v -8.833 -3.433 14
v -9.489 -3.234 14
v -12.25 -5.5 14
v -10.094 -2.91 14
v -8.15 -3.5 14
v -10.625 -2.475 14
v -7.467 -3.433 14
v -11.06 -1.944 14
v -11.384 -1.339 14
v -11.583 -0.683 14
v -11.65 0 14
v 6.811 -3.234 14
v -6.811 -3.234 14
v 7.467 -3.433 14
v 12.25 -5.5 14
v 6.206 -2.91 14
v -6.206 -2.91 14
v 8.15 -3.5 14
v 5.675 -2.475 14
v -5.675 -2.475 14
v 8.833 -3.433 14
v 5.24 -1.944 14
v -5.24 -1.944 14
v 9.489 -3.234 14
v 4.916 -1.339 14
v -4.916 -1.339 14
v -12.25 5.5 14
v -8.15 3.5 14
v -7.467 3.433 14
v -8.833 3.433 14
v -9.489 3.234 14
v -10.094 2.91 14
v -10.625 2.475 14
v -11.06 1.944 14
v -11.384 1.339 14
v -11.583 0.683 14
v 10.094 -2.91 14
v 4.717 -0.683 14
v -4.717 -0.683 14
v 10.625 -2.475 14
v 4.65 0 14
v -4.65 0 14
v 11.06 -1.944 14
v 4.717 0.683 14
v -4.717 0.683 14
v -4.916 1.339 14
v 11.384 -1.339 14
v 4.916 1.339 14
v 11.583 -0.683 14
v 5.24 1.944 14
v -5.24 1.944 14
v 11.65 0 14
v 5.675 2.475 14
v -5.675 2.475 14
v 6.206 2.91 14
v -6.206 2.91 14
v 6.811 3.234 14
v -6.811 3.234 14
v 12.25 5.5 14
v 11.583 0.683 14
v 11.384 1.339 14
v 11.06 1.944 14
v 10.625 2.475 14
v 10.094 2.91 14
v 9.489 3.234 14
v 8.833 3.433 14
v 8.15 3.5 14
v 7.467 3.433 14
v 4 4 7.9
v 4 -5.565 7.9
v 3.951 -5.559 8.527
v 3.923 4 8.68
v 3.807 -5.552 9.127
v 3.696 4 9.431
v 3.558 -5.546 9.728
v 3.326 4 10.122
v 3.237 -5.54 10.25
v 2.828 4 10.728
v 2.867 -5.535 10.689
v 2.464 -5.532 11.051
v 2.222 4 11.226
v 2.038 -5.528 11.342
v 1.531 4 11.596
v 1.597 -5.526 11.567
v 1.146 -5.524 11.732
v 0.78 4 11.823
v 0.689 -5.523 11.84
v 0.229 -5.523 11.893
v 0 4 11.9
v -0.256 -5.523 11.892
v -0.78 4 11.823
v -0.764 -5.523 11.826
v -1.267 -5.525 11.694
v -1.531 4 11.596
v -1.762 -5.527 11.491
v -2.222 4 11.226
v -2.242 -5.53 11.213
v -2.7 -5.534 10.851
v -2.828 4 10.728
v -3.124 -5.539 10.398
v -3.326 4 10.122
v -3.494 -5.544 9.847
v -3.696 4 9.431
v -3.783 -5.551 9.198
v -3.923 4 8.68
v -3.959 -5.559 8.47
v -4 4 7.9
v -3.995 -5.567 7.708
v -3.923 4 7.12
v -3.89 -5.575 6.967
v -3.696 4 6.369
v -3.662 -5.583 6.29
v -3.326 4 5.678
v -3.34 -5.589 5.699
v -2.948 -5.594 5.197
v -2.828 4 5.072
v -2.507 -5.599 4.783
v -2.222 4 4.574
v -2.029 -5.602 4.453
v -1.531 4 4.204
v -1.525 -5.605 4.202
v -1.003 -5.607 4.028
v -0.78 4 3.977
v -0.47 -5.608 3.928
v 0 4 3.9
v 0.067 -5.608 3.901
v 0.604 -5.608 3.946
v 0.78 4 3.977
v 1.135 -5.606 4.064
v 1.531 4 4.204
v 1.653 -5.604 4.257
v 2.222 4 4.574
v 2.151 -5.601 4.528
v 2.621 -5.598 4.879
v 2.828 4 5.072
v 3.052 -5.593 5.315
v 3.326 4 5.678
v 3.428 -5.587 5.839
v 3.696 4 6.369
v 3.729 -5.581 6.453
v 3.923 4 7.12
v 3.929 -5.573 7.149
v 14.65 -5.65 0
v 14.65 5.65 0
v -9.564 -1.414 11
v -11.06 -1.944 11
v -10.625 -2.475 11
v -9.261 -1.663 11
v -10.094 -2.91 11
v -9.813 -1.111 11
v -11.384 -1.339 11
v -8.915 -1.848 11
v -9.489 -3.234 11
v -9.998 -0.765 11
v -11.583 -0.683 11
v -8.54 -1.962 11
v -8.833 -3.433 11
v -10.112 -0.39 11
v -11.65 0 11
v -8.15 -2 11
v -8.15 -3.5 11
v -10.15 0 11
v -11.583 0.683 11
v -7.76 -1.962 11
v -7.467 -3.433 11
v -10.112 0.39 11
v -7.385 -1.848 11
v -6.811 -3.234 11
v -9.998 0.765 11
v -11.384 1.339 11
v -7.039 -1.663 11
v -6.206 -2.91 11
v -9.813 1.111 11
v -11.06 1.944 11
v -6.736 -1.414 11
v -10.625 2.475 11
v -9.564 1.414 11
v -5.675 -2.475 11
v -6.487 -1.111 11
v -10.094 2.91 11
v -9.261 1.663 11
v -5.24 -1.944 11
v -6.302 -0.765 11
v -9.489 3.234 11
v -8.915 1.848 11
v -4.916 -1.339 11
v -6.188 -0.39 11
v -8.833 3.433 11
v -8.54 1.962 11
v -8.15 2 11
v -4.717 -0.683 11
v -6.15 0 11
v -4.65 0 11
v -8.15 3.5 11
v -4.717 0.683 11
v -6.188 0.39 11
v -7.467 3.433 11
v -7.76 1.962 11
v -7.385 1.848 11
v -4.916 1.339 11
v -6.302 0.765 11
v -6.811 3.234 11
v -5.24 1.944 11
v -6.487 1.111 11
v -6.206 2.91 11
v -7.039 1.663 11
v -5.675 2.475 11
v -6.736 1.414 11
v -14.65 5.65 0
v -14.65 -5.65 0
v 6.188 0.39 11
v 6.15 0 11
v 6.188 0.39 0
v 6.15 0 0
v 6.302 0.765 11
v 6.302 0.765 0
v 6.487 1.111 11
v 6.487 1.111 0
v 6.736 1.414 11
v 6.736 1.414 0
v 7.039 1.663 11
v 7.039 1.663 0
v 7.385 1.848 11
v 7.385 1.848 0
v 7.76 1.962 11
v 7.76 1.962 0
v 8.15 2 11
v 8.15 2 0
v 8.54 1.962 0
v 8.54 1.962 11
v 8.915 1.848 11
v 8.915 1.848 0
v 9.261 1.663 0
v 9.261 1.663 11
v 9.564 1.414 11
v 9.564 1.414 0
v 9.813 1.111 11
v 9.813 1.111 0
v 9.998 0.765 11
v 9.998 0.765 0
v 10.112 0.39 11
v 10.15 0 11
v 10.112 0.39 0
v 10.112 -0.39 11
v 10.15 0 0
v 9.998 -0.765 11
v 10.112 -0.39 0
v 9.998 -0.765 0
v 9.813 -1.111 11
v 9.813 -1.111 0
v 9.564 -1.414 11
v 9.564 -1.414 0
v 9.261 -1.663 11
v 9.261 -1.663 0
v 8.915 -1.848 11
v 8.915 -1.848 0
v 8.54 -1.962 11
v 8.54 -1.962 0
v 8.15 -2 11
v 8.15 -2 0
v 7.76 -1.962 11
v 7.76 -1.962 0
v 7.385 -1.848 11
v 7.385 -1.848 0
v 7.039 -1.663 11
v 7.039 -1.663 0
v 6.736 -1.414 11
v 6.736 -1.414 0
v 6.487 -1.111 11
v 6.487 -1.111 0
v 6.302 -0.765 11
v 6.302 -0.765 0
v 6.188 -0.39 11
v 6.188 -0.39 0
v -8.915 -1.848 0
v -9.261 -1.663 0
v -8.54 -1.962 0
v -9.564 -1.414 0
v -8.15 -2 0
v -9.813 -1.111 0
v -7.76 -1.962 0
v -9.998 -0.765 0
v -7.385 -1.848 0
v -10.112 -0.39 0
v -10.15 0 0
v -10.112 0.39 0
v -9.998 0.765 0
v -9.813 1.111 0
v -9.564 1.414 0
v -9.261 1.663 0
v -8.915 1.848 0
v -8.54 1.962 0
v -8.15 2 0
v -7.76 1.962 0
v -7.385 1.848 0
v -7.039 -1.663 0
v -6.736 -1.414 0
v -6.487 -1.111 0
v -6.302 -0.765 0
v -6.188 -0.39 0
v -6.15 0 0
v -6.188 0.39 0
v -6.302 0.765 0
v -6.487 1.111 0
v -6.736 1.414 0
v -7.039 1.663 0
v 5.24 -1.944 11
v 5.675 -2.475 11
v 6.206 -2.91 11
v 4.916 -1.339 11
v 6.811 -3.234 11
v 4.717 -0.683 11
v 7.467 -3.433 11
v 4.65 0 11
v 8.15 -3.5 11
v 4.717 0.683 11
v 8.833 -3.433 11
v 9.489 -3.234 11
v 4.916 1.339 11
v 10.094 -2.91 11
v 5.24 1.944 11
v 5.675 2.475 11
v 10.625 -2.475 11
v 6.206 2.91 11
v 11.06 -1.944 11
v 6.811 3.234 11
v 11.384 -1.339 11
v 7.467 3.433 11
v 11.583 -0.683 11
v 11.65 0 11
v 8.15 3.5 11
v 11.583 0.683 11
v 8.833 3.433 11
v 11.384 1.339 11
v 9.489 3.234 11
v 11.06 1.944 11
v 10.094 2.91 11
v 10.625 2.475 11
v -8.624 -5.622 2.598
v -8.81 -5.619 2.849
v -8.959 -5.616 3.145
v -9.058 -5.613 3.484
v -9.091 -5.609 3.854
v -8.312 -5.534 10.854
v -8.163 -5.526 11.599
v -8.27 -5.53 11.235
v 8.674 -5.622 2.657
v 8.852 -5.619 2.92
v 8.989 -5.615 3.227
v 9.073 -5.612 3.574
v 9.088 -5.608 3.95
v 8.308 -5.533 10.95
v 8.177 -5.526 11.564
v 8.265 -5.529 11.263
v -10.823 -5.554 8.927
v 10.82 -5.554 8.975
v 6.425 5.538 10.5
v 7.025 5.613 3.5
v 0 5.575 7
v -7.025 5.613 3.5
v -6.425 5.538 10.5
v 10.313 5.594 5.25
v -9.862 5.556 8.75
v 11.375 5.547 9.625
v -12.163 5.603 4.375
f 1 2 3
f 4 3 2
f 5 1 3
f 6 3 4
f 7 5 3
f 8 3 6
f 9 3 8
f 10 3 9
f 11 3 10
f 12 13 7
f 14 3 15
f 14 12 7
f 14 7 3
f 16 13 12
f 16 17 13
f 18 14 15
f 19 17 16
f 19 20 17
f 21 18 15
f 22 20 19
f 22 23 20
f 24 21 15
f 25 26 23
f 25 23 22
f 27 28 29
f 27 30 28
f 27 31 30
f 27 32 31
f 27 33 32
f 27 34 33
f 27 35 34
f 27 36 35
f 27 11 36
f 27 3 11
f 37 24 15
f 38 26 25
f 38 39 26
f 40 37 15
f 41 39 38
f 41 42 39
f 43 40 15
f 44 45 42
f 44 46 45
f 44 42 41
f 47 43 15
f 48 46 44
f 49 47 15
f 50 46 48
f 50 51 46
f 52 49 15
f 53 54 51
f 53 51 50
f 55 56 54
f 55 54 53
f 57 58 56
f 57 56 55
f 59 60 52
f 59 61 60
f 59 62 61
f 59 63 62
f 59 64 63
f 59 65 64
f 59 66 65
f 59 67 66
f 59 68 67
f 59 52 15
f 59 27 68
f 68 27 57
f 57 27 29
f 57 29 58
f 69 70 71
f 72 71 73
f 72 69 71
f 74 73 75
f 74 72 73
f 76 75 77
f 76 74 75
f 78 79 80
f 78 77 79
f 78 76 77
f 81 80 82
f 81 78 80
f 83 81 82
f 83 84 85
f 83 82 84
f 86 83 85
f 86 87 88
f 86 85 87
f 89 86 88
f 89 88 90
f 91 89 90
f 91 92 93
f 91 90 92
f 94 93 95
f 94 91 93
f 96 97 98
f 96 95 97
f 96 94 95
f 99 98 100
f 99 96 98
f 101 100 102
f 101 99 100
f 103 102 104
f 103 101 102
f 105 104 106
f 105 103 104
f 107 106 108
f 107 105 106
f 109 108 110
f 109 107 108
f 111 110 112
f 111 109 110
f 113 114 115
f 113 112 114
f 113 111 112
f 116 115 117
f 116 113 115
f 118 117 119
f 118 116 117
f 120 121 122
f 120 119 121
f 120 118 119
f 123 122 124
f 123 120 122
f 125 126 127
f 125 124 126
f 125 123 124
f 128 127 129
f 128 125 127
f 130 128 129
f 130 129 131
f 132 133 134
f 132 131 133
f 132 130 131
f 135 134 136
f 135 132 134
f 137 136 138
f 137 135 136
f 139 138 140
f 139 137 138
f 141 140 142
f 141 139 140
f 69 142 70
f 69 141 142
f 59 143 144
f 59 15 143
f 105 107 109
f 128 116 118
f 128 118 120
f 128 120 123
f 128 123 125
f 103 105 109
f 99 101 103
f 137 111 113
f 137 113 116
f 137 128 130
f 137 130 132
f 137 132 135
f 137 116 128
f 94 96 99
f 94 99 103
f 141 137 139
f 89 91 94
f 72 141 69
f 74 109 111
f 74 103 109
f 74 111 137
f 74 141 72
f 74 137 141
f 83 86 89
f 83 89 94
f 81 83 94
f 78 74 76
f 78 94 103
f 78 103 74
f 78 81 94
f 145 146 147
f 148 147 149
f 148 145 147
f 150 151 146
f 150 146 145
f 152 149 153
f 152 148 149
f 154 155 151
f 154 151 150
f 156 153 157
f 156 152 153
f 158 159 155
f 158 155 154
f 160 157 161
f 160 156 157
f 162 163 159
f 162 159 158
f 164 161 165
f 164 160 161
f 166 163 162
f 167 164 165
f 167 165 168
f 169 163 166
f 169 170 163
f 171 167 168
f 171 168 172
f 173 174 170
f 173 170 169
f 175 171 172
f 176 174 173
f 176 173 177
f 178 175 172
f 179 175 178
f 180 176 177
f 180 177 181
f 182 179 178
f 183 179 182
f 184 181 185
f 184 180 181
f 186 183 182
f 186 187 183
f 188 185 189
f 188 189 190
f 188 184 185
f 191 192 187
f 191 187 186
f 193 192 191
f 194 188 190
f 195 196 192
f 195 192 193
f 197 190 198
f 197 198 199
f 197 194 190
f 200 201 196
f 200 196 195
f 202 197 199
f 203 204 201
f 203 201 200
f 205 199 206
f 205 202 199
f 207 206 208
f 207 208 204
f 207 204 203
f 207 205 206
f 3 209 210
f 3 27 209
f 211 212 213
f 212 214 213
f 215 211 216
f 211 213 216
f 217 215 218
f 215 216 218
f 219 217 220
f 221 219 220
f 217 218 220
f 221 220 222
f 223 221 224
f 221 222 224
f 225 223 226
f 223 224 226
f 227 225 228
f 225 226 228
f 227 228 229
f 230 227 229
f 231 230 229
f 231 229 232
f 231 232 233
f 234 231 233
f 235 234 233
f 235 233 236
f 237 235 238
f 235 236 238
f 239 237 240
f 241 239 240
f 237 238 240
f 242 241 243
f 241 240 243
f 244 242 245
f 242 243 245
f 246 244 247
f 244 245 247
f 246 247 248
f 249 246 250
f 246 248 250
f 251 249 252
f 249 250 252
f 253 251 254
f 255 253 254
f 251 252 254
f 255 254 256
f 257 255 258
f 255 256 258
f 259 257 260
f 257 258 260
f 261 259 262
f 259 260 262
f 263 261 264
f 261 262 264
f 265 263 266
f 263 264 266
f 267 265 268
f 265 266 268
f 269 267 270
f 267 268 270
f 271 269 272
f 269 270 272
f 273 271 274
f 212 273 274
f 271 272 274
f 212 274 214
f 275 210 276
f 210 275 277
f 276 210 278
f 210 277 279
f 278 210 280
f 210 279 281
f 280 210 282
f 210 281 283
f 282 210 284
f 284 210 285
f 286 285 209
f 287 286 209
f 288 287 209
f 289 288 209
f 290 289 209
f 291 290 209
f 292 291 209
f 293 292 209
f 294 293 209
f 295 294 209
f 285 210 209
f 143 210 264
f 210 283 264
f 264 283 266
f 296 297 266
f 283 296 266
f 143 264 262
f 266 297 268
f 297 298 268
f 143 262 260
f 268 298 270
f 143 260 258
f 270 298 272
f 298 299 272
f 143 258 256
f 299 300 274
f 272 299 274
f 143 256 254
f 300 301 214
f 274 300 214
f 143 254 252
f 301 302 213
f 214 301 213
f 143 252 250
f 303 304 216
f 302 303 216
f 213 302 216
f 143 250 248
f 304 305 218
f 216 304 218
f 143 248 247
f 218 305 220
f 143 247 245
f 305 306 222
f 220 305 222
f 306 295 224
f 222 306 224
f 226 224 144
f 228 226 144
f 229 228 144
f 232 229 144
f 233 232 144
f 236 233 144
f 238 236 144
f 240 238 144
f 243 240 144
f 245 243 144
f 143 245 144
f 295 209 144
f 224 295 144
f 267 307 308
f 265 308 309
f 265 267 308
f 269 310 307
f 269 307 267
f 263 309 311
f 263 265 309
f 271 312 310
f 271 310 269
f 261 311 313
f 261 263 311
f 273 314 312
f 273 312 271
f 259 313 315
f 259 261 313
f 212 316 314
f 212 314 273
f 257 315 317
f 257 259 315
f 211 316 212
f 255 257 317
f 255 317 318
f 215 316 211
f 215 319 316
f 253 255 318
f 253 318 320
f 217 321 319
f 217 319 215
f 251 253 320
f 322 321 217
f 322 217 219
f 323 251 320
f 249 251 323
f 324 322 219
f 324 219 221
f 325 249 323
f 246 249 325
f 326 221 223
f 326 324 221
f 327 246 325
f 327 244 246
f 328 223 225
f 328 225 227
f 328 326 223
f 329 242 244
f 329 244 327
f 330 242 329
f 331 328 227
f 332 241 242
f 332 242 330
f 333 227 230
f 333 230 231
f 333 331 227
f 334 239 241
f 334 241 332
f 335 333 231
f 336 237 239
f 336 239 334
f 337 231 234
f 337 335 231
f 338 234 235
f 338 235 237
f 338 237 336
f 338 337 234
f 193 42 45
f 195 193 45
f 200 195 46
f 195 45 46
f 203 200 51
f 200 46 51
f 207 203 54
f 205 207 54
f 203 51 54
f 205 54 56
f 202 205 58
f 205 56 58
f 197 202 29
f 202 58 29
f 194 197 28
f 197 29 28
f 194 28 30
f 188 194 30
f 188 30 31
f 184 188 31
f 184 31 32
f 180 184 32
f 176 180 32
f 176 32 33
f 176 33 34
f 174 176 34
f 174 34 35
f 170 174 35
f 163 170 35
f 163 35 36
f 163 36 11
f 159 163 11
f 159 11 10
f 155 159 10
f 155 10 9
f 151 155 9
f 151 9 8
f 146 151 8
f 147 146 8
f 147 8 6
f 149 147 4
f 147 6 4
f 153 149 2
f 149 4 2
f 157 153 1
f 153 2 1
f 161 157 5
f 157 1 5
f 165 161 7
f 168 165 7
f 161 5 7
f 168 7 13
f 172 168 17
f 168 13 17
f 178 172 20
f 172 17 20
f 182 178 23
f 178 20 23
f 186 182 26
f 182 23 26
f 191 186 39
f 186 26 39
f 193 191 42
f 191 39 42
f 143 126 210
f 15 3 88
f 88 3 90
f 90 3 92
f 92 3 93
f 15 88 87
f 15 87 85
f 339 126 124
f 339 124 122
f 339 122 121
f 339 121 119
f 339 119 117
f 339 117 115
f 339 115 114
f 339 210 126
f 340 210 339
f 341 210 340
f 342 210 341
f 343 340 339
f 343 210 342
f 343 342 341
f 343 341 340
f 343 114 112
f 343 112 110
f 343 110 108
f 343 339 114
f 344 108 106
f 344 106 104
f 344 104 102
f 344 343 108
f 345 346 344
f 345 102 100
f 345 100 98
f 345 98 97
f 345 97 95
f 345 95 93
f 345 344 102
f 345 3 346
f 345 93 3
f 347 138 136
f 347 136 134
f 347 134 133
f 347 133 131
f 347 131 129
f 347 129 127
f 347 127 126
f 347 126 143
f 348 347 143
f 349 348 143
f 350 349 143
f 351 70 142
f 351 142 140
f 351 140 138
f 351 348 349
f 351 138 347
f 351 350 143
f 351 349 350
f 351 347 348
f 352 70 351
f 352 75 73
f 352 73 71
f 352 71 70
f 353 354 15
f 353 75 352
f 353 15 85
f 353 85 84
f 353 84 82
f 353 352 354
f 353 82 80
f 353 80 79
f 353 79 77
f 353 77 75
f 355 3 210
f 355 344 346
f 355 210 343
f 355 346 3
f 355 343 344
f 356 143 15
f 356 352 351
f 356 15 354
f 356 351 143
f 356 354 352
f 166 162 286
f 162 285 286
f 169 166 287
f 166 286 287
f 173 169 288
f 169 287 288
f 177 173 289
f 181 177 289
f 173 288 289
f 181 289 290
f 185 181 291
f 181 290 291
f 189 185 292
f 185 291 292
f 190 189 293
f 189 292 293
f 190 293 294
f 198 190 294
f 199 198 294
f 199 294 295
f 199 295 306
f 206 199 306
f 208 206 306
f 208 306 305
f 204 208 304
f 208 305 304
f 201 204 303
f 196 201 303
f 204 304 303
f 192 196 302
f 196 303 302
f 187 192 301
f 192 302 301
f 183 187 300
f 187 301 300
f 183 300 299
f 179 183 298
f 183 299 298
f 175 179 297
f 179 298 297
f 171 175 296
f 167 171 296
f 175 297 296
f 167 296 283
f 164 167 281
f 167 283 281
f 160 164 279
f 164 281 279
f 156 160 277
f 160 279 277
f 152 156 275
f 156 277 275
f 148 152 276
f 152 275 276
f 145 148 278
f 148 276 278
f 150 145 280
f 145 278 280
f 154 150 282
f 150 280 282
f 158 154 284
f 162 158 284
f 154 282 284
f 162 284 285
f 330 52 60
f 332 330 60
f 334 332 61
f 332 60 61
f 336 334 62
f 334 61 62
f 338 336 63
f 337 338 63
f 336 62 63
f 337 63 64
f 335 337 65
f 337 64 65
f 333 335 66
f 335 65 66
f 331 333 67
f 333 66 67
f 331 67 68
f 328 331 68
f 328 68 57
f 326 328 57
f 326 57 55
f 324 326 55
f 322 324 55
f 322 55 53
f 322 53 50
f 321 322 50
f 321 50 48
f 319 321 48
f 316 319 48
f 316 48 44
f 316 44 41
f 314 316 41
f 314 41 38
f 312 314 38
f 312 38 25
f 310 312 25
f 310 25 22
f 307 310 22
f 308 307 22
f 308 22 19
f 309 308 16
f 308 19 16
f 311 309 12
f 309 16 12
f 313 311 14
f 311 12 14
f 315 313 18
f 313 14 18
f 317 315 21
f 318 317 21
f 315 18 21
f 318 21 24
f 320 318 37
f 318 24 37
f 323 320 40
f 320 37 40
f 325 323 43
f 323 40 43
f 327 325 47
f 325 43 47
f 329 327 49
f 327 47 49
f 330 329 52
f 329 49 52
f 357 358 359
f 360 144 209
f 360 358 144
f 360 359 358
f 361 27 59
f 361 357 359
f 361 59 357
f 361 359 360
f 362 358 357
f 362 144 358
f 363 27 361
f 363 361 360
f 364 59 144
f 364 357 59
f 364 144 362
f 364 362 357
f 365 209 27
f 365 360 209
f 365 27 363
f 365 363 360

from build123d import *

# Parameters (mm, degrees)
F0_W           = 29.3
F0_H           = 11.3
F2_W           = 24.5
F2_H           = 11
F6_D           = 4
F6_CBORE_D     = 7
F6_CBORE_DEPTH = 3
F7_R           = 4
F8_DEPTH       = 5.6510001
F8_DEPTH_BACK  = 4


with BuildPart() as f3:
    # F0 (on Top) → F3 section 0
    with BuildSketch(Plane.XY):
        Rectangle(F0_W, F0_H)
    # F2 (on offset) → F3 section 1
    with BuildSketch(Plane.XY.offset(14)):
        Rectangle(F2_W, F2_H)
    loft()

    # F6 (through all)
    with Locations(Plane.XY.offset(14)):
        with Locations((-8.15, 0), (8.15, 0)):
            CounterBoreHole(F6_D / 2, F6_CBORE_D / 2, F6_CBORE_DEPTH)

    # F7 (on Front) → F8 (cut, two sides)
    with BuildSketch(Plane.XZ) as f8_sk:
        with Locations((0, 7.9)):
            Circle(F7_R)
    extrude(amount=F8_DEPTH, mode=Mode.SUBTRACT)
    extrude(f8_sk.sketch, amount=-F8_DEPTH_BACK, mode=Mode.SUBTRACT)


solid = f3.part
